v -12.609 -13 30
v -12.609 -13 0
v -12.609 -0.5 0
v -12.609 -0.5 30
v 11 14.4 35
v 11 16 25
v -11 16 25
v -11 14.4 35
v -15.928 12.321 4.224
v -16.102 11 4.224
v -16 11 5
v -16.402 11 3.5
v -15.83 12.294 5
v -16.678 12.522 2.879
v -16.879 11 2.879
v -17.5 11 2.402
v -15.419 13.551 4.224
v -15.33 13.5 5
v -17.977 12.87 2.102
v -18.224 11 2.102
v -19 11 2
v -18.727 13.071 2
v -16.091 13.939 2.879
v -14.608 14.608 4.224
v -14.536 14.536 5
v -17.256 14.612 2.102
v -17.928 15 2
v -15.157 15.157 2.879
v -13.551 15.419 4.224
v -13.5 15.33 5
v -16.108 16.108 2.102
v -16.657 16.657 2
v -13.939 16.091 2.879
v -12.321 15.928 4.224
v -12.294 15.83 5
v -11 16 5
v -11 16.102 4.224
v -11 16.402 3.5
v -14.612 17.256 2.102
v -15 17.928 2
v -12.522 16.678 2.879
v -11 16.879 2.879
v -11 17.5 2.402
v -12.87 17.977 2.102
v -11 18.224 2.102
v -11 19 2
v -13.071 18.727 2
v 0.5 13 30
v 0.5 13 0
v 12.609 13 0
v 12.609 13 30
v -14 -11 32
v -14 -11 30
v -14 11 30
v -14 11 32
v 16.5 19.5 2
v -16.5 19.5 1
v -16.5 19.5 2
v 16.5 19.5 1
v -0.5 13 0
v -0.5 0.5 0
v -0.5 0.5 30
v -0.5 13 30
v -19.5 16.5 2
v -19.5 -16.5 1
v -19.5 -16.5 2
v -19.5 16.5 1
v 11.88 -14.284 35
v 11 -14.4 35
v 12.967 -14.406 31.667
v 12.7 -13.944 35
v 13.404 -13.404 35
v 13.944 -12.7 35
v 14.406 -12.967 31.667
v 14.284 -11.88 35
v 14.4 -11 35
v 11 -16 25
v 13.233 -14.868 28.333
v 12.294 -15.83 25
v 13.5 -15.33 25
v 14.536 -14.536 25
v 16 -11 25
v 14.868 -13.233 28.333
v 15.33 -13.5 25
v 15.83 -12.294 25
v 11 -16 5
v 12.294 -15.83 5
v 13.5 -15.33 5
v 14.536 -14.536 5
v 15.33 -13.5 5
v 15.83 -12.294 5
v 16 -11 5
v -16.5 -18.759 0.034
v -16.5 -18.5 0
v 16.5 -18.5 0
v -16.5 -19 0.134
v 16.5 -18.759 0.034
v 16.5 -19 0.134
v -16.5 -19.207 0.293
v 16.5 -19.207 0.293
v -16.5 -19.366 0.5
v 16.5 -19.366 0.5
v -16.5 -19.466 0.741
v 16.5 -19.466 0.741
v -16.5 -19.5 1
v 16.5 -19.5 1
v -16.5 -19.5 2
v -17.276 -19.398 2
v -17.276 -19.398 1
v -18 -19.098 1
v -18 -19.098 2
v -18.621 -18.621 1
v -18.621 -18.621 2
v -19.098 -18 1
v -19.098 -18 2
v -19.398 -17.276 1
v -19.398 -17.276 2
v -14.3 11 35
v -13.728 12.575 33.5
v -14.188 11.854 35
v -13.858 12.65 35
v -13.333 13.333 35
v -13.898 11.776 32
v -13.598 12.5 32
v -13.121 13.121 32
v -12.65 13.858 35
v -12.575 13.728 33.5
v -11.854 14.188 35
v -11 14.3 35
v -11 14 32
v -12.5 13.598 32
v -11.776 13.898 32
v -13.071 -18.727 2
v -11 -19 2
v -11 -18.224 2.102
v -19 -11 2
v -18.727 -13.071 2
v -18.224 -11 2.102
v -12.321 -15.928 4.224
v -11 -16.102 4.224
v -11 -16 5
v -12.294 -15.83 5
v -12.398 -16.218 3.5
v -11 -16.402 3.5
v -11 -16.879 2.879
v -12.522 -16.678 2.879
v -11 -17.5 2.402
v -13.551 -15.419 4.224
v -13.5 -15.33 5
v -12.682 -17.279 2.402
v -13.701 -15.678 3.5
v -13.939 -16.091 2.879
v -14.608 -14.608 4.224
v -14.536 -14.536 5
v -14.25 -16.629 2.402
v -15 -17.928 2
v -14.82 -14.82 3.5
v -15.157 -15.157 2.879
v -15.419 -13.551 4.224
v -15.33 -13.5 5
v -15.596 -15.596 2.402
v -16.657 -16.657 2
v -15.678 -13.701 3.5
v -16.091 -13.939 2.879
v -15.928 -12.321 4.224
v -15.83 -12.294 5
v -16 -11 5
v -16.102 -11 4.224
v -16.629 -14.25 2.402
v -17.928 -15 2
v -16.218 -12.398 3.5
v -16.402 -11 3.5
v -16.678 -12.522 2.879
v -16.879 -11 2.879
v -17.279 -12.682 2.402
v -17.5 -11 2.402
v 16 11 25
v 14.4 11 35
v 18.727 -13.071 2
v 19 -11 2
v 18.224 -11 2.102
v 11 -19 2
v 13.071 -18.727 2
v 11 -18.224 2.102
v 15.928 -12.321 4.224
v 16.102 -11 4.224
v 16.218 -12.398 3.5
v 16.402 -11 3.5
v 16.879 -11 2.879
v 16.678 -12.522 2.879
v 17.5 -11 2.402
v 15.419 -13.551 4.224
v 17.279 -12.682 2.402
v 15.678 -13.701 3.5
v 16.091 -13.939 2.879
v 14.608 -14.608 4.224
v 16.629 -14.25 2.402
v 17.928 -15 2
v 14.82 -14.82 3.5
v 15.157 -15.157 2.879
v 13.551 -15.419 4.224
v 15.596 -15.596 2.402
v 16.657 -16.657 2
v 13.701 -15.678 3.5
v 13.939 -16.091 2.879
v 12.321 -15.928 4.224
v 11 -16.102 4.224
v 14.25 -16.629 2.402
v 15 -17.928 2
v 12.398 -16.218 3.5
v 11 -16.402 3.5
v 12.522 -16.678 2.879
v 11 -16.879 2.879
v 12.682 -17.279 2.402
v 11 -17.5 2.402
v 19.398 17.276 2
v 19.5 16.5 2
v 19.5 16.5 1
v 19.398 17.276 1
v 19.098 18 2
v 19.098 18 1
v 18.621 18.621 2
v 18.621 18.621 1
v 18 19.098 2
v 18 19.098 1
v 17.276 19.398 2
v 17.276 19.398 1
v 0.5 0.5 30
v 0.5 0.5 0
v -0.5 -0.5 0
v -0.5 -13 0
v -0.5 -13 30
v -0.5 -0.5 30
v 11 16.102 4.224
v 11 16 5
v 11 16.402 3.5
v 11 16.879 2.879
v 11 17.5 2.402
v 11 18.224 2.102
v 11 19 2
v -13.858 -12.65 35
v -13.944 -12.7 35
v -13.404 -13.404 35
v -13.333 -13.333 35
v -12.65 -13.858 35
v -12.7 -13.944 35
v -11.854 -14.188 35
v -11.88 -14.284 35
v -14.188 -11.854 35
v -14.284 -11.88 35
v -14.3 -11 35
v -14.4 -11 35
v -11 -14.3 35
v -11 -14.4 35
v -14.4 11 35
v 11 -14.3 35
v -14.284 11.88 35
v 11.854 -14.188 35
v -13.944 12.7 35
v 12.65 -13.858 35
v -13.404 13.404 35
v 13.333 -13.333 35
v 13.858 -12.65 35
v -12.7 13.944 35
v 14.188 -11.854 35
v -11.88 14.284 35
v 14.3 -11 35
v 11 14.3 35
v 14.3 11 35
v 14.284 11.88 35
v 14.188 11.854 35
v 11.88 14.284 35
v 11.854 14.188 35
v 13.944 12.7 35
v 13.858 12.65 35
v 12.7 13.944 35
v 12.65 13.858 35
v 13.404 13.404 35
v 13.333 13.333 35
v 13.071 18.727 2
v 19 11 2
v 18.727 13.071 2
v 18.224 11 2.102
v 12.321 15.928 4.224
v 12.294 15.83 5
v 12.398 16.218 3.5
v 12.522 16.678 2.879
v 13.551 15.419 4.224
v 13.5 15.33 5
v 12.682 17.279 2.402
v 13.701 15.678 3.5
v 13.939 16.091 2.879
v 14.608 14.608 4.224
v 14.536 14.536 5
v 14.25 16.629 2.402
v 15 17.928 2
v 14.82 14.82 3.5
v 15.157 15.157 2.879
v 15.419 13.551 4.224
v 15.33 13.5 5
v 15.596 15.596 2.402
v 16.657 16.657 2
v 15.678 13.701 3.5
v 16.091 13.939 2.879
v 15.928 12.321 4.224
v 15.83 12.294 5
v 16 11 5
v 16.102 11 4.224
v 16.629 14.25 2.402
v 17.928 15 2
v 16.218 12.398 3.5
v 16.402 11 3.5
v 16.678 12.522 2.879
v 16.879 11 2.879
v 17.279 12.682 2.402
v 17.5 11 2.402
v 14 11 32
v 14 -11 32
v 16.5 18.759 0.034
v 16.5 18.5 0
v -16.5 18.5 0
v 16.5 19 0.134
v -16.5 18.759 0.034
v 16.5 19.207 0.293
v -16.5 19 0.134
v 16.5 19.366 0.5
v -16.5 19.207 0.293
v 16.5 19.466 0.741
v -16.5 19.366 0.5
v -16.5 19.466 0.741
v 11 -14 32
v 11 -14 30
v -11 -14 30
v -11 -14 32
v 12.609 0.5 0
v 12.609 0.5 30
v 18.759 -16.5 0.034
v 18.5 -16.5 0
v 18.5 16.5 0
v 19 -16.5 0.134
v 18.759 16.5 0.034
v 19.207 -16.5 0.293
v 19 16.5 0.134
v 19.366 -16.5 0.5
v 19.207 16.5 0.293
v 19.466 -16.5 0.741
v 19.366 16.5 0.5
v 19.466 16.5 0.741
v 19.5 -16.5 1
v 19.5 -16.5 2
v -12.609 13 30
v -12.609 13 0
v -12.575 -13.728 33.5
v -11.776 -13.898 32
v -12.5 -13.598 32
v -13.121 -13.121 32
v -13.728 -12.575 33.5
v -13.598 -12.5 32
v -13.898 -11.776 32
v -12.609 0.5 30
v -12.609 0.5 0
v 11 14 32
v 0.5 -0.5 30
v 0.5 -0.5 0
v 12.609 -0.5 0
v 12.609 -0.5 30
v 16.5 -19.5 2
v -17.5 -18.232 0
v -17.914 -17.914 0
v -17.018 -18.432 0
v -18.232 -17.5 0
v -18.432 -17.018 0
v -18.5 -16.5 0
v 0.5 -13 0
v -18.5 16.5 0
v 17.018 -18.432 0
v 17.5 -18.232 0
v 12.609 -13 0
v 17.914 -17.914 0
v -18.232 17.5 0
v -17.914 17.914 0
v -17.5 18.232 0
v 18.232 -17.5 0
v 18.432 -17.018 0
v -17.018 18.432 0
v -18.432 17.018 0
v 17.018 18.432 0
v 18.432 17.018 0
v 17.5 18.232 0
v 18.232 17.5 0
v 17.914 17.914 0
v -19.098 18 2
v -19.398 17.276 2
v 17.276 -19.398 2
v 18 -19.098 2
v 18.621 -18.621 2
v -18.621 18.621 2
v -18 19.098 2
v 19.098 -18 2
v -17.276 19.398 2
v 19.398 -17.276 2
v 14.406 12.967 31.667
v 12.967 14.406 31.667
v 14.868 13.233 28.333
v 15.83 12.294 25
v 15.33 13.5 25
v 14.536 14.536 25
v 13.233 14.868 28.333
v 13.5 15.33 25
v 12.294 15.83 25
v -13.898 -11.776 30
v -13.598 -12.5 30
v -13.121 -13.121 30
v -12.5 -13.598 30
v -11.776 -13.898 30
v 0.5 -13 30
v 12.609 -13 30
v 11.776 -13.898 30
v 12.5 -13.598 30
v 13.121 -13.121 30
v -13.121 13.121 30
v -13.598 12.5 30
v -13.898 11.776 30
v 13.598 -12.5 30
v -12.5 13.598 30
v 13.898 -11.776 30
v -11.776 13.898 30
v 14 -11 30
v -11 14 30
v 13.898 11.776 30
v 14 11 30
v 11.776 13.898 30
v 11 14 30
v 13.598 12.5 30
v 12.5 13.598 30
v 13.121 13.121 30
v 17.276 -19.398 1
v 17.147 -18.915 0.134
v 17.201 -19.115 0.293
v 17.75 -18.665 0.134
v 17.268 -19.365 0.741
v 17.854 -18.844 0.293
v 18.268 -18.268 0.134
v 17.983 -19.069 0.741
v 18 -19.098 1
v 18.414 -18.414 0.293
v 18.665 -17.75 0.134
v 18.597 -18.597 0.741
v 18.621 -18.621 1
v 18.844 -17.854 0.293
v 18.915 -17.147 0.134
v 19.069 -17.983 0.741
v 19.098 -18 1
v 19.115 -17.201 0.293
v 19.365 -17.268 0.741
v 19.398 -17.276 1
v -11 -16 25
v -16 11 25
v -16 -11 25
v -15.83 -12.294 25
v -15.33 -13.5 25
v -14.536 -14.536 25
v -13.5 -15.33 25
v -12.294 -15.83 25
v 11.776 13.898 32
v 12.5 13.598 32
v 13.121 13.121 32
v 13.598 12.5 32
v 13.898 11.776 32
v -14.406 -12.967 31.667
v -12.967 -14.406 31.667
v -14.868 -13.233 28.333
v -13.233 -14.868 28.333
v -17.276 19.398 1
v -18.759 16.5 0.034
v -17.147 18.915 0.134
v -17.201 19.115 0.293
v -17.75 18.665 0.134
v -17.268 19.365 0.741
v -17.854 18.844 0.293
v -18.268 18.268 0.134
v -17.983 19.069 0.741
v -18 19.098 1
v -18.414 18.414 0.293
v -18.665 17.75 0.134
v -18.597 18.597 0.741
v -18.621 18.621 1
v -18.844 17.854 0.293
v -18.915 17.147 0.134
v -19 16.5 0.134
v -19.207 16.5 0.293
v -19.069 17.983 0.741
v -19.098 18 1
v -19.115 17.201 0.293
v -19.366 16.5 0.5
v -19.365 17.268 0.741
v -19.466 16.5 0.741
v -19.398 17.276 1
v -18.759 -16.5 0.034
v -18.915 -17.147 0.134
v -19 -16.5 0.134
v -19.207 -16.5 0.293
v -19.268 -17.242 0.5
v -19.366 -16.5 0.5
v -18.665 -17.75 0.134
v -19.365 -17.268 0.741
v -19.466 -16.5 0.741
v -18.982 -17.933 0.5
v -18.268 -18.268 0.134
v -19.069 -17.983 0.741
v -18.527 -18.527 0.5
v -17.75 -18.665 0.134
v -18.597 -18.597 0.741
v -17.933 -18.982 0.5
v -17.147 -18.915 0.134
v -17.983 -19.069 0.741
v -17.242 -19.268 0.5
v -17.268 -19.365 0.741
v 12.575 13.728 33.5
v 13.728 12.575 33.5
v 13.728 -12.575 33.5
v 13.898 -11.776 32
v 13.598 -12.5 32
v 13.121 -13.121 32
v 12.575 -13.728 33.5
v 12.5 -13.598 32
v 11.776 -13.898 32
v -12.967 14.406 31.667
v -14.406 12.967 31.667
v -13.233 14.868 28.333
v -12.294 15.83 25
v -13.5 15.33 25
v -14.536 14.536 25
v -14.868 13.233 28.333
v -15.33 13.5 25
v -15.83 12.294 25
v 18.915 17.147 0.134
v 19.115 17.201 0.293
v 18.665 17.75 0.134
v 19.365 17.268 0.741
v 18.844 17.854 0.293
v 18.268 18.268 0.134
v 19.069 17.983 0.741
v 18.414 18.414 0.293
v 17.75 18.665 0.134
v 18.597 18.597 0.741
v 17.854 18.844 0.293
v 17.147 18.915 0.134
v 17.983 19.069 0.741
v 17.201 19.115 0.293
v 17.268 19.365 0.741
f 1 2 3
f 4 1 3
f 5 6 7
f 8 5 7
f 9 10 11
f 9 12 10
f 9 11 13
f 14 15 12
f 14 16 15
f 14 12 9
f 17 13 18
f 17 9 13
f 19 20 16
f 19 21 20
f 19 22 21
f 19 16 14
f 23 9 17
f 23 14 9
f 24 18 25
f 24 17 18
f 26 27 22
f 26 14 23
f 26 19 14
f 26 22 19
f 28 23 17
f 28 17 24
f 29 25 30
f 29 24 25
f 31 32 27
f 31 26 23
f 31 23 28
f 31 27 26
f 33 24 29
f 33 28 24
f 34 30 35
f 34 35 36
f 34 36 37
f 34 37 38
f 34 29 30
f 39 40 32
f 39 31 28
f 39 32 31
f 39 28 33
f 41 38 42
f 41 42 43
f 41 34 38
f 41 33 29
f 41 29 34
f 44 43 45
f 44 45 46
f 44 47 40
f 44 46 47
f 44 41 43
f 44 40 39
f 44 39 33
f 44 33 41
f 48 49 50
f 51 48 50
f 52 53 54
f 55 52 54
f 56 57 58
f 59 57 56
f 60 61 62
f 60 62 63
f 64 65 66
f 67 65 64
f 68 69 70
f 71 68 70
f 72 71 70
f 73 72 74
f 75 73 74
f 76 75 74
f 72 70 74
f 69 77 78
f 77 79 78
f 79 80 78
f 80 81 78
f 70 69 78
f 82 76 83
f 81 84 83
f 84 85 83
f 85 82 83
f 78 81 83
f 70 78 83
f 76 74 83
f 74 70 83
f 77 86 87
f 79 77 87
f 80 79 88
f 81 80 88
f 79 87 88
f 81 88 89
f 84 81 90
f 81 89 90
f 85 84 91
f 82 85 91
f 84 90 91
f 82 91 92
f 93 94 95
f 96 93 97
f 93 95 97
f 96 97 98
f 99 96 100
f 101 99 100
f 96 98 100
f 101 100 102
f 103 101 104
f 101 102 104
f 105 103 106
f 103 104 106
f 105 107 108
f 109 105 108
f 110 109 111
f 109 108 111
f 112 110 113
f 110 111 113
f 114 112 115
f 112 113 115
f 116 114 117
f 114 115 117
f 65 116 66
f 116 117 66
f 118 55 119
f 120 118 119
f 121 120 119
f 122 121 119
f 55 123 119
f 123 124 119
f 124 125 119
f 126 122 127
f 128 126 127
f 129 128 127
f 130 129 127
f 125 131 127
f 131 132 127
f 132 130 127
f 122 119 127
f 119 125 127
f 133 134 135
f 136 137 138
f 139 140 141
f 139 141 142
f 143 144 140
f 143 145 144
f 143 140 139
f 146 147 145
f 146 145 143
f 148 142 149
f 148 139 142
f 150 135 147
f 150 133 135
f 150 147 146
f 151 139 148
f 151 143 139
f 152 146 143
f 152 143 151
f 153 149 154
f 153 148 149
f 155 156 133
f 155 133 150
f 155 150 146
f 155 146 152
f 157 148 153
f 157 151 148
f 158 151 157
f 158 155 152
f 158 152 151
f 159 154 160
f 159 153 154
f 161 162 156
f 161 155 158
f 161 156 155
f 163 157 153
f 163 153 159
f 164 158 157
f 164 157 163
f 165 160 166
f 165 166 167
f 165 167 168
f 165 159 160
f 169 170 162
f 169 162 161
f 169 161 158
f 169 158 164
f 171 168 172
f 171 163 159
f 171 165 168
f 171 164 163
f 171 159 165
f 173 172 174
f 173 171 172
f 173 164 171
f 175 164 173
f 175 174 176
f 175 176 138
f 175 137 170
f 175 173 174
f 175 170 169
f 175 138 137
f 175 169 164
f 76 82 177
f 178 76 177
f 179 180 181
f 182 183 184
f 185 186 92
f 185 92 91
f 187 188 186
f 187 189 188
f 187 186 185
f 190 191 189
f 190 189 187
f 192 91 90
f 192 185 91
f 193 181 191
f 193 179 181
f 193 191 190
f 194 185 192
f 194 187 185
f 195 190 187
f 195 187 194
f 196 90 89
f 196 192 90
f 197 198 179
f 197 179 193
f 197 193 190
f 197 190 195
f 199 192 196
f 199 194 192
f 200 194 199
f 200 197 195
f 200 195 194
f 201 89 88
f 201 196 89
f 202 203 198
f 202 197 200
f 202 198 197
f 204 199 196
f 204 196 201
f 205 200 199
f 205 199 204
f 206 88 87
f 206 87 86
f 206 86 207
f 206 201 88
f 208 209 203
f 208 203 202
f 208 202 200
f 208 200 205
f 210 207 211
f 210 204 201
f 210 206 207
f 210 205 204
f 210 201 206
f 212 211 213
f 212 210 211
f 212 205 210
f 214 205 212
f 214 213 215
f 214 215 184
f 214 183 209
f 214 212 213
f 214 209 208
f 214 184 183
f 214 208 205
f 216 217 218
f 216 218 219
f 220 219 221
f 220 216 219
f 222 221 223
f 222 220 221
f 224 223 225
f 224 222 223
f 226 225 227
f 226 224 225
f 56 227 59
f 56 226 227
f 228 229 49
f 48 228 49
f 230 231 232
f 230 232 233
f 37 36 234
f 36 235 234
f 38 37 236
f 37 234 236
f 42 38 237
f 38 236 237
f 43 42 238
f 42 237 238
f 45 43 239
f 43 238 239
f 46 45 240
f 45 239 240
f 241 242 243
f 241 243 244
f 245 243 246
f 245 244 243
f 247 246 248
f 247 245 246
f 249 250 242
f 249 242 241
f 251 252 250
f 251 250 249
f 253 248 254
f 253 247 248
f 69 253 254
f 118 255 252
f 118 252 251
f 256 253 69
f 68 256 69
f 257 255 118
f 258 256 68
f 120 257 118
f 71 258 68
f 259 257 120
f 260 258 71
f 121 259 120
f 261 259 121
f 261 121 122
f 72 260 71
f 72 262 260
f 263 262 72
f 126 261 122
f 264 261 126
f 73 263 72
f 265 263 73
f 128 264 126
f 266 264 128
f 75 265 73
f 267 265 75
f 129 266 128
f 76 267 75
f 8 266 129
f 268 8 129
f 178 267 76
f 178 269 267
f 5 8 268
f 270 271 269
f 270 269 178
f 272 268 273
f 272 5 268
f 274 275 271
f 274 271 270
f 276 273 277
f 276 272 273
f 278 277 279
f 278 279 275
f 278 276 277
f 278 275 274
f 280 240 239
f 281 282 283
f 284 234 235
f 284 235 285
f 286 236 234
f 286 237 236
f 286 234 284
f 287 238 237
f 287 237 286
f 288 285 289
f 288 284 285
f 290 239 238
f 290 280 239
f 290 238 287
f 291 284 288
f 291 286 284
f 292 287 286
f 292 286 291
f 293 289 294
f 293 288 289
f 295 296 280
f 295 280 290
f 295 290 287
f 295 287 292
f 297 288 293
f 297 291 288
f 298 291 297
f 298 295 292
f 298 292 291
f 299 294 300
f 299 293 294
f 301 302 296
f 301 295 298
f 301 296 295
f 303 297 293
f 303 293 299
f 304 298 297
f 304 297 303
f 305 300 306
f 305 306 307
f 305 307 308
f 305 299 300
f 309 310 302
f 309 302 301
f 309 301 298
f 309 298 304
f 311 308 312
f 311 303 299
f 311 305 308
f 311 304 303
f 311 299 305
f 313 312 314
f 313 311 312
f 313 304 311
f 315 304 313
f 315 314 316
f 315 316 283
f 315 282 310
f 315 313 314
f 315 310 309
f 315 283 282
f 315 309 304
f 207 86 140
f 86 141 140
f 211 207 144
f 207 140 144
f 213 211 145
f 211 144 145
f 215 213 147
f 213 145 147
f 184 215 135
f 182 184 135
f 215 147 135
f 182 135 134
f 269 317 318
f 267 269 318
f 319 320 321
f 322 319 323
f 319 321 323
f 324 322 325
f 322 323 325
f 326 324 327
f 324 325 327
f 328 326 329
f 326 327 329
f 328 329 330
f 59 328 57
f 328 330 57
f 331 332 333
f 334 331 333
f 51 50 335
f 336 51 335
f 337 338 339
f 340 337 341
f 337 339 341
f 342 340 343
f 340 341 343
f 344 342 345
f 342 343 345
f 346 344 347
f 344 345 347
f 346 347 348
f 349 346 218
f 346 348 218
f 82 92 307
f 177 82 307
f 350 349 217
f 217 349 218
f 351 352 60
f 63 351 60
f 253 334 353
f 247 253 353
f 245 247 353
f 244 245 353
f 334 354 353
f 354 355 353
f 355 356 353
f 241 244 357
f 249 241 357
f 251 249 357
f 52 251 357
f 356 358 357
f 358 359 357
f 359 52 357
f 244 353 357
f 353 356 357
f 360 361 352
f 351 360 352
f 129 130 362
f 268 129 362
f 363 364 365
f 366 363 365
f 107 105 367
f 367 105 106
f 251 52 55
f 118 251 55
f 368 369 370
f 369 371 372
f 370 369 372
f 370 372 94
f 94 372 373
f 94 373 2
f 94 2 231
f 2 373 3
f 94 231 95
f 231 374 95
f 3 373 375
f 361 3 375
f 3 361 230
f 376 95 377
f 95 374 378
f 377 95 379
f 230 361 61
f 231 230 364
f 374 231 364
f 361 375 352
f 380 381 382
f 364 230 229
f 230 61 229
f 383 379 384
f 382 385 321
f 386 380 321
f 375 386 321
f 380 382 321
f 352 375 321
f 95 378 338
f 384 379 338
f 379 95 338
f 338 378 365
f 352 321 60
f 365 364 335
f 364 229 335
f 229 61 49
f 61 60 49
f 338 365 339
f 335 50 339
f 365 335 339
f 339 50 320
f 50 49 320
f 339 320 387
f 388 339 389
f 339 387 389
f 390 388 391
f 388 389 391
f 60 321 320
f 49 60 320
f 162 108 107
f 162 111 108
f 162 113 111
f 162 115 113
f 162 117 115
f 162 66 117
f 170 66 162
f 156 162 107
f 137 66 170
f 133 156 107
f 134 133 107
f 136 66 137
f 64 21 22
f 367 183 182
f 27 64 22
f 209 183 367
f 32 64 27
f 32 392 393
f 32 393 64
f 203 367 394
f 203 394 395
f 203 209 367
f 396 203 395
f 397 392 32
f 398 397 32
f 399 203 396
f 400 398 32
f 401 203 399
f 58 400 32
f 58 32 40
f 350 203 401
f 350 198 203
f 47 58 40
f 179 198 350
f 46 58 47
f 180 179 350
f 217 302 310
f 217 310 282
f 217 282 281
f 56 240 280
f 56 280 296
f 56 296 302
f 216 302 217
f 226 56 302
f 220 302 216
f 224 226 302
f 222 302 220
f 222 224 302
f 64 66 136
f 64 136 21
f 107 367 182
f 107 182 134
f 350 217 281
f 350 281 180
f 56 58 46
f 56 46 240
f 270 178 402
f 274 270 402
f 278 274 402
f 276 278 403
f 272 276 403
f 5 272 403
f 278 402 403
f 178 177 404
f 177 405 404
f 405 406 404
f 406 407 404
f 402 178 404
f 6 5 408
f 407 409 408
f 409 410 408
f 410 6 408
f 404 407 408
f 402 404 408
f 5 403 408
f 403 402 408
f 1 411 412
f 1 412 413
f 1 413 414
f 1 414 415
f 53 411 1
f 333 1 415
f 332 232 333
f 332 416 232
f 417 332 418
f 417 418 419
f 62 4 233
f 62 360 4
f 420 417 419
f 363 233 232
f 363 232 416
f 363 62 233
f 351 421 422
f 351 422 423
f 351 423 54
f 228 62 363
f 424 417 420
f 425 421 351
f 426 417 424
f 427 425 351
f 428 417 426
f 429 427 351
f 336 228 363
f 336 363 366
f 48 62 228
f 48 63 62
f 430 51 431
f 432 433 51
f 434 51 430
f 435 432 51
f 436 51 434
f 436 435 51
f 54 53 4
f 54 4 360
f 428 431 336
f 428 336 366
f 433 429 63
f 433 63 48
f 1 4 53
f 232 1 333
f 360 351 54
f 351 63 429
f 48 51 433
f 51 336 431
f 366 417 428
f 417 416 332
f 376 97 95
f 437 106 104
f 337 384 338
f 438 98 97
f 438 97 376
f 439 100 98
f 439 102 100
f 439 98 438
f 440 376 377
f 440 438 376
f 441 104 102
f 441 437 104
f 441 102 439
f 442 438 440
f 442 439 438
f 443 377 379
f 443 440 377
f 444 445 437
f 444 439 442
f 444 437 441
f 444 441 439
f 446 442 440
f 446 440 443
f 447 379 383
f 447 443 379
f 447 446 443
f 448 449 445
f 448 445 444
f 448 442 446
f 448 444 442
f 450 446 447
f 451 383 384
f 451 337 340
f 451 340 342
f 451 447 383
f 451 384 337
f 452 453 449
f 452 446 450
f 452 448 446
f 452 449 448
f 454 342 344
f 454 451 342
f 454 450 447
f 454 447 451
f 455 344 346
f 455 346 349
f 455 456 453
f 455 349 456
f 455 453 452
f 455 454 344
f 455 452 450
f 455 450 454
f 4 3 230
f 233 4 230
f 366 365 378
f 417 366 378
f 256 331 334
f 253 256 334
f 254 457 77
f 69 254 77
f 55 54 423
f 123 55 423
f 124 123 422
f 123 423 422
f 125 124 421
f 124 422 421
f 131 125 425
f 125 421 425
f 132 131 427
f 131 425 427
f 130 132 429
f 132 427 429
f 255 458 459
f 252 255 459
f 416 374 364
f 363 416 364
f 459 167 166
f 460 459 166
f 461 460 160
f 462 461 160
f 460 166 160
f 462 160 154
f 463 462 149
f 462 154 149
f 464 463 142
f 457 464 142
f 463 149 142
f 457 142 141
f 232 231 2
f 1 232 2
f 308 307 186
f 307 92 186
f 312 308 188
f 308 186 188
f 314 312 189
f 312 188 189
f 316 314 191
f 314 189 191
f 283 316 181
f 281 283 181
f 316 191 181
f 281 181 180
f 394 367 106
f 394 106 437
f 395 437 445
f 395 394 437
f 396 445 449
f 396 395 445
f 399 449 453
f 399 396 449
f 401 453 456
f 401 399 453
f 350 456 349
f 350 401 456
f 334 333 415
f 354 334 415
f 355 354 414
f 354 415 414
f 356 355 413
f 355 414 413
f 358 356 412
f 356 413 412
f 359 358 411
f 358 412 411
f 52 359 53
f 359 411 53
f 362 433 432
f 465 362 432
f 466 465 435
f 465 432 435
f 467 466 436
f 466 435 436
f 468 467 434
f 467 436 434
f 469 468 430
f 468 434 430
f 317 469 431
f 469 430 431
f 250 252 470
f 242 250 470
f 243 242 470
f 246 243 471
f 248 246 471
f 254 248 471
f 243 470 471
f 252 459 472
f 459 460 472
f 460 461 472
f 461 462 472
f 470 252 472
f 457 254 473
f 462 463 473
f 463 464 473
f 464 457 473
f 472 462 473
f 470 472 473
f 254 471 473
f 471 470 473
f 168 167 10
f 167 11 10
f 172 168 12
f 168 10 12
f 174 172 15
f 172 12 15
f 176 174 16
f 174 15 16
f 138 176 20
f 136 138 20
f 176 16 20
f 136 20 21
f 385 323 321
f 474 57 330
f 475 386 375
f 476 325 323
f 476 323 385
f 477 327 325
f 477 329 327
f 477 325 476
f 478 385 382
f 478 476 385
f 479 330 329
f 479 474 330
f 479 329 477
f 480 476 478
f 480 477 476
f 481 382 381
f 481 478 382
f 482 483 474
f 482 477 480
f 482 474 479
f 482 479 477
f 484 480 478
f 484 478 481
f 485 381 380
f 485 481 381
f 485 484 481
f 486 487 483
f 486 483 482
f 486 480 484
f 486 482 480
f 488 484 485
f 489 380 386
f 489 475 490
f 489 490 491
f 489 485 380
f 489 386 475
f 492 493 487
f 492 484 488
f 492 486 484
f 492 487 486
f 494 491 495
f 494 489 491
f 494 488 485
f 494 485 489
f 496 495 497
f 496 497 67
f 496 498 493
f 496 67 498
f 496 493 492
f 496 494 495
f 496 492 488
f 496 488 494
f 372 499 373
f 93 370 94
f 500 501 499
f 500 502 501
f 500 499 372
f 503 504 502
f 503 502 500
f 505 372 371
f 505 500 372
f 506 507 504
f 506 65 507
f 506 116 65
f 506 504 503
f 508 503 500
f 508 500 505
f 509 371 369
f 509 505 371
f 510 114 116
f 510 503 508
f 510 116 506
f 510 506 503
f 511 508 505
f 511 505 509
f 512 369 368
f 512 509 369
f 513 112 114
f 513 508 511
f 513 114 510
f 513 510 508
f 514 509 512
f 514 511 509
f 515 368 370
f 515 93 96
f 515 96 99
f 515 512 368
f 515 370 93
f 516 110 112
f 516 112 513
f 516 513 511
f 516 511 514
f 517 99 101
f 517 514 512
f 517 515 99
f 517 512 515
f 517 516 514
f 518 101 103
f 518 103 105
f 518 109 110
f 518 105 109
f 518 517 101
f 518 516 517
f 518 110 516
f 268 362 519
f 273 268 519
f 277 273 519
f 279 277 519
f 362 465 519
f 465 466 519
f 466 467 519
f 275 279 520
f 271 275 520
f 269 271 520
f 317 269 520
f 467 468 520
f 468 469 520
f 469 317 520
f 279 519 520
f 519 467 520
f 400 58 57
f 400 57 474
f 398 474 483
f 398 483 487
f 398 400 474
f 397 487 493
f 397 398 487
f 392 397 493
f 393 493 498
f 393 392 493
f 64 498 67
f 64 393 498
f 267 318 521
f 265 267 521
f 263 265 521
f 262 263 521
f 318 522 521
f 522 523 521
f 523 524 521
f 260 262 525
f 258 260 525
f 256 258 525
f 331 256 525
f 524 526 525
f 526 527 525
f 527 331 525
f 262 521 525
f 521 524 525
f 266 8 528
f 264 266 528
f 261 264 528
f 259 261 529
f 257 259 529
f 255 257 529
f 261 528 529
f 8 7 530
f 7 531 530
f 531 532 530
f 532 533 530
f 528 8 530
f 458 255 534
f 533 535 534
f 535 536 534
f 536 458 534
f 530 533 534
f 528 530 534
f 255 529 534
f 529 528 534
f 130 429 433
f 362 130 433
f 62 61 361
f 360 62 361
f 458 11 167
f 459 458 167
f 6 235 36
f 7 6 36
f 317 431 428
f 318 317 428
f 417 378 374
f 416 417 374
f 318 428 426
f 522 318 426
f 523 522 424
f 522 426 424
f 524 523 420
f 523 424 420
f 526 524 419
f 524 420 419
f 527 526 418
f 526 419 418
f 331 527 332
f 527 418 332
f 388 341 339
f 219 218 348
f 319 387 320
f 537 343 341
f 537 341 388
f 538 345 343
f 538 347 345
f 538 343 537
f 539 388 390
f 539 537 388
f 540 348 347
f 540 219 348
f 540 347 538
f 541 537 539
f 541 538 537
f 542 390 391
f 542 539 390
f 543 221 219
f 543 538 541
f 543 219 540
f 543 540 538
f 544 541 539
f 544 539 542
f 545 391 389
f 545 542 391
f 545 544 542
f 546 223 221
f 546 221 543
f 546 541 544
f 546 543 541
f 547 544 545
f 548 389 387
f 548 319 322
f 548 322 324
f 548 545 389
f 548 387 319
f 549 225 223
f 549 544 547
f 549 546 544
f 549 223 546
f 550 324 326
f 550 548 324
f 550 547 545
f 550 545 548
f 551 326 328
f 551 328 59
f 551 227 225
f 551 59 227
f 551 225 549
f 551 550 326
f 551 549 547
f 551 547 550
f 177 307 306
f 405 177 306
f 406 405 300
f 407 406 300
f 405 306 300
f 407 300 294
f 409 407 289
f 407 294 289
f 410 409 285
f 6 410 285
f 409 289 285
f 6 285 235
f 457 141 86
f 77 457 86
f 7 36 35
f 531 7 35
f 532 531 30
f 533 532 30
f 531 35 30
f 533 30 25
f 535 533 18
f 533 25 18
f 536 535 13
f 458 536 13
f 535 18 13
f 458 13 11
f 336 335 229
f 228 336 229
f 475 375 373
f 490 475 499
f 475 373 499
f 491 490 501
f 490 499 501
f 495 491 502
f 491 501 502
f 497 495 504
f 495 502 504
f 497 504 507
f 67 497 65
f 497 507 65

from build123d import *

# Parameters (mm, degrees)
F0_W     = 39
F0_H     = 39
F1_DEPTH = 2
F2_DEPTH = 35
F3_SIZE2 = 10
F3_SIZE  = 1.6
F4_DEPTH = 30
F5_SIZE2 = 3
F5_SIZE  = 0.3
F0_W_2   = 12.1088270918
F0_H_2   = 1
F0_W_3   = 1
F0_H_3   = 12.5
F6_DEPTH = 30
F7_R     = 3
F8_R     = 1


with BuildPart() as f1:
    # F0 (on Top) → F1 (new body)
    with BuildSketch(Plane.XY):
        Rectangle(F0_W, F0_H)
        with BuildLine():
            Line((-16, -11), (-16, 11))
            ThreePointArc((-16, 11), (-14.5355339059, 14.5355339059), (-11, 16))
            Line((-11, 16), (11, 16))
            ThreePointArc((11, 16), (14.5355339059, 14.5355339059), (16, 11))
            Line((16, 11), (16, -11))
            ThreePointArc((16, -11), (14.5355339059, -14.5355339059), (11, -16))
            Line((11, -16), (-11, -16))
            ThreePointArc((-11, -16), (-14.5355339059, -14.5355339059), (-16, -11))
        make_face(mode=Mode.SUBTRACT)
        with BuildLine():
            ThreePointArc((-11, 16), (-14.5355339059, 14.5355339059), (-16, 11))
            Line((-16, 11), (-16, -11))
            ThreePointArc((-16, -11), (-14.5355339059, -14.5355339059), (-11, -16))
            Line((-11, -16), (11, -16))
            ThreePointArc((11, -16), (14.5355339059, -14.5355339059), (16, -11))
            Line((16, -11), (16, 11))
            ThreePointArc((16, 11), (14.5355339059, 14.5355339059), (11, 16))
            Line((11, 16), (-11, 16))
        make_face()
        with BuildLine():
            Line((-14, -11), (-14, 11))
            ThreePointArc((-14, 11), (-13.1213203436, 13.1213203436), (-11, 14))
            Line((-11, 14), (11, 14))
            ThreePointArc((11, 14), (13.1213203436, 13.1213203436), (14, 11))
            Line((14, 11), (14, -11))
            ThreePointArc((14, -11), (13.1213203436, -13.1213203436), (11, -14))
            Line((11, -14), (-11, -14))
            ThreePointArc((-11, -14), (-13.1213203436, -13.1213203436), (-14, -11))
        make_face(mode=Mode.SUBTRACT)
    extrude(amount=F1_DEPTH)

    # F0 (on Top) → F2 (join)
    with BuildSketch(Plane.XY):
        with BuildLine():
            ThreePointArc((-11, 16), (-14.5355339059, 14.5355339059), (-16, 11))
            Line((-16, 11), (-16, -11))
            ThreePointArc((-16, -11), (-14.5355339059, -14.5355339059), (-11, -16))
            Line((-11, -16), (11, -16))
            ThreePointArc((11, -16), (14.5355339059, -14.5355339059), (16, -11))
            Line((16, -11), (16, 11))
            ThreePointArc((16, 11), (14.5355339059, 14.5355339059), (11, 16))
            Line((11, 16), (-11, 16))
        make_face()
        with BuildLine():
            Line((-14, -11), (-14, 11))
            ThreePointArc((-14, 11), (-13.1213203436, 13.1213203436), (-11, 14))
            Line((-11, 14), (11, 14))
            ThreePointArc((11, 14), (13.1213203436, 13.1213203436), (14, 11))
            Line((14, 11), (14, -11))
            ThreePointArc((14, -11), (13.1213203436, -13.1213203436), (11, -14))
            Line((11, -14), (-11, -14))
            ThreePointArc((-11, -14), (-13.1213203436, -13.1213203436), (-14, -11))
        make_face(mode=Mode.SUBTRACT)
    extrude(amount=F2_DEPTH)

    # F3
    f3_edges = [f1.edges().sort_by_distance(p)[0] for p in [
        (0, -16, 35),
        (14.535534, -14.535534, 35),
        (16, 0, 35),
        (14.535534, 14.535534, 35),
        (0, 16, 35),
        (-14.535534, 14.535534, 35),
        (-16, 0, 35),
        (-14.535534, -14.535534, 35),
    ]]
    f3_side = f1.faces().sort_by_distance((-14.215534, 14.215534, 35))[0]
    chamfer(f3_edges, length=F3_SIZE, length2=F3_SIZE2, reference=f3_side)

    # F0 (on Top) → F4 (join)
    with BuildSketch(Plane.XY):
        with BuildLine():
            ThreePointArc((-11, 14), (-13.1213203436, 13.1213203436), (-14, 11))
            Line((-14, 11), (-14, -11))
            ThreePointArc((-14, -11), (-13.1213203436, -13.1213203436), (-11, -14))
            Line((-11, -14), (11, -14))
            ThreePointArc((11, -14), (13.1213203436, -13.1213203436), (14, -11))
            Line((14, -11), (14, 11))
            ThreePointArc((14, 11), (13.1213203436, 13.1213203436), (11, 14))
            Line((11, 14), (-11, 14))
        make_face()
        Polygon((-12.6088270918, 0.5), (-12.6088270918, 13), (-0.5, 13), (0.5, 13), (12.6088270918, 13), (12.6088270918, 0.5), (12.6088270918, -0.5), (12.6088270918, -13), (0.5, -13), (-0.5, -13), (-12.6088270918, -13), (-12.6088270918, -0.5), align=None, mode=Mode.SUBTRACT)
    extrude(amount=F4_DEPTH)

    # F5
    f5_edges = [f1.edges().sort_by_distance(p)[0] for p in [
        (0, 14, 35),
        (13.12132, 13.12132, 35),
        (14, 0, 35),
        (13.12132, -13.12132, 35),
        (0, -14, 35),
        (-13.12132, -13.12132, 35),
        (-14, 0, 35),
        (-13.12132, 13.12132, 35),
    ]]
    f5_side = f1.faces().sort_by_distance((0, -14.359271, 35))[0]
    chamfer(f5_edges, length=F5_SIZE, length2=F5_SIZE2, reference=f5_side)

    # F0 (on Top) → F6 (join)
    with BuildSketch(Plane.XY):
        with Locations((6.5544135459, 0)):
            Rectangle(F0_W_2, F0_H_2)
        with Locations((0, -6.75)):
            Rectangle(F0_W_3, F0_H_3)
        with Locations((-6.5544135459, 0)):
            Rectangle(F0_W_2, F0_H_2)
        Rectangle(F0_W_3, F0_H_2)
        with Locations((0, 6.75)):
            Rectangle(F0_W_3, F0_H_3)
    extrude(amount=F6_DEPTH)

    # F7
    f7_edges = [f1.edges().sort_by_distance(p)[0] for p in [
        (0, 16, 2),
        (-19.5, 19.5, 1),
        (19.5, 19.5, 1),
        (-19.5, -19.5, 1),
        (19.5, -19.5, 1),
    ]]
    fillet(f7_edges, radius=F7_R)

    # F8
    f8_edges = [f1.edges().sort_by_distance(p)[0] for p in [
        (0, -19.5, 0),
    ]]
    fillet(f8_edges, radius=F8_R)


solid = f1.part
